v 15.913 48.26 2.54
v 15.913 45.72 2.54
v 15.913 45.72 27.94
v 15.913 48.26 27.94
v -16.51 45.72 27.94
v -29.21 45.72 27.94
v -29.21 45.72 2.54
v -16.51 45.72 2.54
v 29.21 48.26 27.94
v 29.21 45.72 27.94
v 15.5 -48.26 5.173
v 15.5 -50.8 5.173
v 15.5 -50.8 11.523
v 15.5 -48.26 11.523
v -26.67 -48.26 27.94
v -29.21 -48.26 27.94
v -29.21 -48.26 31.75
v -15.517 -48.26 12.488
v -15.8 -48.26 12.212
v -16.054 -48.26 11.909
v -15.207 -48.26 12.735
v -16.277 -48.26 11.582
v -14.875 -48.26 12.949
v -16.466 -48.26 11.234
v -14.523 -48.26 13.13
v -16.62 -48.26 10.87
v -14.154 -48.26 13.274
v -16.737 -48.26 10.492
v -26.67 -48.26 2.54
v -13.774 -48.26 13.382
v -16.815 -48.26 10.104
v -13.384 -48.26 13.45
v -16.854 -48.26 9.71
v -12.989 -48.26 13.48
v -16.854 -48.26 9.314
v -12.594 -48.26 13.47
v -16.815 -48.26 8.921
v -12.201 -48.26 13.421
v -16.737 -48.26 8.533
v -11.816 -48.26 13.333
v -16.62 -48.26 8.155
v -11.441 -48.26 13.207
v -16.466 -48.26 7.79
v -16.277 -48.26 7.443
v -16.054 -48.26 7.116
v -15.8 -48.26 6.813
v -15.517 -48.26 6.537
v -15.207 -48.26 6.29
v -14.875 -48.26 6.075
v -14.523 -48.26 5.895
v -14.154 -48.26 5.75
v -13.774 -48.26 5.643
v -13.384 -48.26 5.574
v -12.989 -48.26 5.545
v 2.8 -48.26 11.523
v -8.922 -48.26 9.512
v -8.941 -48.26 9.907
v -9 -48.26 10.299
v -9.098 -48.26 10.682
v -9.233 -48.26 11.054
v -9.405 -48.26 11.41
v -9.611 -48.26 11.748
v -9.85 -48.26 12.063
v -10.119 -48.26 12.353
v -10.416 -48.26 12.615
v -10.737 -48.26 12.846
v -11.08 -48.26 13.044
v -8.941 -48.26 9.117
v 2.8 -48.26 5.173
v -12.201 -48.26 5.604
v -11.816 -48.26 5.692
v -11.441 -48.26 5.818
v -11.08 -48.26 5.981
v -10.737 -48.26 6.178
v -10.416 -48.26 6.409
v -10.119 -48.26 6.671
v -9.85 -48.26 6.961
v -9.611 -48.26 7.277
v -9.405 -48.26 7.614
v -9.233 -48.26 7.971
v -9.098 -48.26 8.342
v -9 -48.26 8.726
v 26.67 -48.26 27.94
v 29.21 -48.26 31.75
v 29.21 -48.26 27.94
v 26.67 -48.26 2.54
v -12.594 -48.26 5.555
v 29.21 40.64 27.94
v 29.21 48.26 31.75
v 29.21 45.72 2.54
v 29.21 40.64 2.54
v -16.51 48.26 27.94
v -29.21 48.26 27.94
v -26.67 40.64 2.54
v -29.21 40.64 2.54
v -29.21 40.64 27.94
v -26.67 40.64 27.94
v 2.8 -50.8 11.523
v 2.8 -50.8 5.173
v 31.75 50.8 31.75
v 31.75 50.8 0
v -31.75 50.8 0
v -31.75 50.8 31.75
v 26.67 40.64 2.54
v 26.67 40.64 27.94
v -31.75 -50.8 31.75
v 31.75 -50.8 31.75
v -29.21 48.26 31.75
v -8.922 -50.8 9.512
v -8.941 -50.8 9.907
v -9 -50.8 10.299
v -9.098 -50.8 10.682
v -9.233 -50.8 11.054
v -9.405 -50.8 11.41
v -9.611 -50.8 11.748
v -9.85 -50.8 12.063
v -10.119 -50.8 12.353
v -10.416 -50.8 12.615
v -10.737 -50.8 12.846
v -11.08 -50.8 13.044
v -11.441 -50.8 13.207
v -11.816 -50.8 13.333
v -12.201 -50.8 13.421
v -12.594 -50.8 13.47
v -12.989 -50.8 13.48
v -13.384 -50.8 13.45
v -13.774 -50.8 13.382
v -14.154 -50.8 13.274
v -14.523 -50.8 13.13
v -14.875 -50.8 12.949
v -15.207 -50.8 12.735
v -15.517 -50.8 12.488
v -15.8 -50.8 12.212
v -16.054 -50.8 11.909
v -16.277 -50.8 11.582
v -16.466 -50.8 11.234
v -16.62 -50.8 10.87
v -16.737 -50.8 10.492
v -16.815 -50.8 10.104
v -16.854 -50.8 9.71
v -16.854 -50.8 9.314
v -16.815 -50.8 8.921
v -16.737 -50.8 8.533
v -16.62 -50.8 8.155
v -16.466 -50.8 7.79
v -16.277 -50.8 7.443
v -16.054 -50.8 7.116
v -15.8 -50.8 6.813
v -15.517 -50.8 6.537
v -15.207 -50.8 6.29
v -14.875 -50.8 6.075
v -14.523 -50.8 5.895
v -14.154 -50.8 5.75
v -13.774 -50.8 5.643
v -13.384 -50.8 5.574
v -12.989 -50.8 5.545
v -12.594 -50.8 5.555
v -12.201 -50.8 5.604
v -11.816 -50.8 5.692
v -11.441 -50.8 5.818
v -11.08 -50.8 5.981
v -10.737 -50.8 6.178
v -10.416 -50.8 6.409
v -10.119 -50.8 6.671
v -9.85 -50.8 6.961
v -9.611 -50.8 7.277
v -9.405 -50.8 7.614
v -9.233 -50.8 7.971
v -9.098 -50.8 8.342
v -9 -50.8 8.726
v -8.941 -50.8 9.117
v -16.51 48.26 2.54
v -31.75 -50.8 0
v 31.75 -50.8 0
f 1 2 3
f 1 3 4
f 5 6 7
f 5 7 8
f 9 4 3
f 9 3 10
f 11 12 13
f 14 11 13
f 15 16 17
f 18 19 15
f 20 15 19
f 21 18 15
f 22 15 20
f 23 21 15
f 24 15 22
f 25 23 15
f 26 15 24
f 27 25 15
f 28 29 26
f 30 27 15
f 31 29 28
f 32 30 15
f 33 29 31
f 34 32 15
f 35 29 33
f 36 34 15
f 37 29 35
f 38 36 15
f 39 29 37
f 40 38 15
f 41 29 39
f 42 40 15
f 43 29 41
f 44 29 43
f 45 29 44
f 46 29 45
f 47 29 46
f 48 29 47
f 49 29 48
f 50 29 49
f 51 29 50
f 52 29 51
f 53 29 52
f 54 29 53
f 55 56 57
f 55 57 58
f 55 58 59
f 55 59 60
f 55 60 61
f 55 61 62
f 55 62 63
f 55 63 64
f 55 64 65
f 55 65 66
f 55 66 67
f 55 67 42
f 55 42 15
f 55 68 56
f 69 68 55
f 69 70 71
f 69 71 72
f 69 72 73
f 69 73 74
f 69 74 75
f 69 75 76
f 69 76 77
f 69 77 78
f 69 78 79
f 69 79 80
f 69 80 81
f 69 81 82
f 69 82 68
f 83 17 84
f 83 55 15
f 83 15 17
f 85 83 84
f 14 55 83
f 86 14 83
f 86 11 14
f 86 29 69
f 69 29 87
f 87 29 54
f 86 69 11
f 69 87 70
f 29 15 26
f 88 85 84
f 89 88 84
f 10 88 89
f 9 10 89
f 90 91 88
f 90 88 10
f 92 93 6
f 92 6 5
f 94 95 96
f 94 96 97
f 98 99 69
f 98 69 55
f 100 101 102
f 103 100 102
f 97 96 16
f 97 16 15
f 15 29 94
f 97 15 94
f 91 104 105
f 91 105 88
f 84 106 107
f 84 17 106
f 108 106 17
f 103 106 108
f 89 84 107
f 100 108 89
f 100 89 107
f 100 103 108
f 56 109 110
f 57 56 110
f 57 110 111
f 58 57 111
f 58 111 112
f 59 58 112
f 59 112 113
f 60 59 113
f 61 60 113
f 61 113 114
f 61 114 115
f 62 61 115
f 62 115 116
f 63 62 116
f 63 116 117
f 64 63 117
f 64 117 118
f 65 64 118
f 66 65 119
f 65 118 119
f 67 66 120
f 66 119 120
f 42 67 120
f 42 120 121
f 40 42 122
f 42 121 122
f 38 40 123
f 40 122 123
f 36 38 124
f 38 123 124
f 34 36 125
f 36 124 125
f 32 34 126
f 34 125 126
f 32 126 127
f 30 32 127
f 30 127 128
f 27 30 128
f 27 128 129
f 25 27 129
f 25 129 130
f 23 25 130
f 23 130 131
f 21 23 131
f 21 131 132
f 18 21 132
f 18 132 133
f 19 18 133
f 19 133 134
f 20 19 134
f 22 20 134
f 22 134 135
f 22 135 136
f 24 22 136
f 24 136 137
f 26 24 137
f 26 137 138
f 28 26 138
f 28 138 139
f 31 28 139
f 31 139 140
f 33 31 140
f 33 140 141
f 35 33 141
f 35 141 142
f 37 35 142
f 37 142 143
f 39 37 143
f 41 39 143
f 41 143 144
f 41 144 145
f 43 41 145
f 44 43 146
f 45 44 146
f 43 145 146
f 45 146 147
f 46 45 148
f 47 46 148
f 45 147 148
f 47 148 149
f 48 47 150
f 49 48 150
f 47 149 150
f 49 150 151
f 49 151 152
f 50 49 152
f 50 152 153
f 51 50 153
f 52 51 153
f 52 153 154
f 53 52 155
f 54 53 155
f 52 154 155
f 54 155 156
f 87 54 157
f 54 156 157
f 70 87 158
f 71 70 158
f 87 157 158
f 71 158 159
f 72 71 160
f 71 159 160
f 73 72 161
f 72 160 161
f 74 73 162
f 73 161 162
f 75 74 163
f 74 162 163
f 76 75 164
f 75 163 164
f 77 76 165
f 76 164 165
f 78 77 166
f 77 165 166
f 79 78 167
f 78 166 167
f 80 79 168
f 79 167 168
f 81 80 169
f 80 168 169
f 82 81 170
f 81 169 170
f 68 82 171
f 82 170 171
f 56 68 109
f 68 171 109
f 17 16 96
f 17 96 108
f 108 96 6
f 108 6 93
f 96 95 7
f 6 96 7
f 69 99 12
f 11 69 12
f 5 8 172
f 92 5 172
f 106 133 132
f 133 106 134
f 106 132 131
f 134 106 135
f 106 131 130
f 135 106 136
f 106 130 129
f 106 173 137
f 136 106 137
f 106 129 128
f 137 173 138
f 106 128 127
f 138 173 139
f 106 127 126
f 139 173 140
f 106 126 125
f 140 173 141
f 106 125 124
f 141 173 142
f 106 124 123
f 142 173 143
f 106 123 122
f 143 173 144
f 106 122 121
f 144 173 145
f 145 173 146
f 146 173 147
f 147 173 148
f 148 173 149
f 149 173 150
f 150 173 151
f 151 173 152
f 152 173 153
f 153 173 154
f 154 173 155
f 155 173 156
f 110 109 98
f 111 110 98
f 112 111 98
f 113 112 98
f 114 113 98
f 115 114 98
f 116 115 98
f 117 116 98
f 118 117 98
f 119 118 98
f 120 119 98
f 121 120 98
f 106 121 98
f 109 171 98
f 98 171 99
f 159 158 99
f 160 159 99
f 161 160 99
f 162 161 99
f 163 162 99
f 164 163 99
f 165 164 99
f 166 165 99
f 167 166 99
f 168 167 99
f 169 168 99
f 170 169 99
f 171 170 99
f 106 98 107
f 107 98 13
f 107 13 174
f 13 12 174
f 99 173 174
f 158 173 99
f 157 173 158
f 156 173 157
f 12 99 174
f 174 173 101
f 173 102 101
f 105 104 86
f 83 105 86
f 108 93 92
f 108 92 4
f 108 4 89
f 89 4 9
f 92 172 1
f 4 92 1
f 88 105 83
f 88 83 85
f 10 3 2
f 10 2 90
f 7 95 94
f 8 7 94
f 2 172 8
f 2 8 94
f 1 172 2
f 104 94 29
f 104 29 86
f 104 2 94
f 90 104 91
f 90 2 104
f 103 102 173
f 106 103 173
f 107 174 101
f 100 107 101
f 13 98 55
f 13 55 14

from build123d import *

# Parameters (mm, degrees)
F0_W     = 58.42
F0_H     = 96.52
F1_DEPTH = 2.54
F0_W_2   = 2.54
F0_H_2   = 2.54
F2_DEPTH = 31.75
F3_W     = 2.54
F3_H     = 5.08
F3_H_2   = 2.54
F3_W_2   = 10.16
F3_W_3   = 10.7568990868
F3_H_3   = 83.82
F4_DEPTH = 25.4
F5_R     = 3.96875
F5_W     = 12.7
F5_H     = 6.35
F6_DEPTH = 25.4


with BuildPart() as f1:
    # F0 (on Top) → F1 (new body)
    with BuildSketch(Plane.XY):
        Rectangle(F0_W, F0_H)
    extrude(amount=F1_DEPTH)

    # F0 (on Top) → F2 (join)
    with BuildSketch(Plane.XY):
        with Locations((-30.48, 49.53)):
            Rectangle(F0_W_2, F0_H_2)
        with Locations((0, 49.53)):
            Rectangle(F0_W, F0_H_2)
        with Locations((-30.48, 0)):
            Rectangle(F0_W_2, F0_H)
        with Locations((30.48, 49.53)):
            Rectangle(F0_W_2, F0_H_2)
        with Locations((-30.48, -49.53)):
            Rectangle(F0_W_2, F0_H_2)
        with Locations((30.48, 0)):
            Rectangle(F0_W_2, F0_H)
        with Locations((0, -49.53)):
            Rectangle(F0_W, F0_H_2)
        with Locations((30.48, -49.53)):
            Rectangle(F0_W_2, F0_H_2)
    extrude(amount=F2_DEPTH)

    # F3 (on face) → F4 (join)
    with BuildSketch(Plane.XY.offset(2.54)):
        with Locations((-27.94, 38.1)):
            Rectangle(F3_W, F3_H)
        with Locations((-27.94, 46.99)):
            Rectangle(F3_W, F3_H_2)
        with Locations((-21.59, 46.99)):
            Rectangle(F3_W_2, F3_H_2)
        with Locations((21.2915504566, 46.99)):
            Rectangle(F3_W_3, F3_H_2)
        with Locations((27.94, 46.99)):
            Rectangle(F3_W, F3_H_2)
        with Locations((27.94, 38.1)):
            Rectangle(F3_W, F3_H)
        with Locations((27.94, -6.35)):
            Rectangle(F3_W, F3_H_3)
        with Locations((-27.94, -6.35)):
            Rectangle(F3_W, F3_H_3)
    extrude(amount=F4_DEPTH)

    # F5 (on face) → F6 (cut)
    with BuildSketch(Plane.XZ.offset(50.8)):
        with Locations((-12.8904990852, 9.5123006031)):
            Circle(F5_R)
        with Locations((9.1495838234, 8.3475278727)):
            Rectangle(F5_W, F5_H)
    extrude(amount=-F6_DEPTH, mode=Mode.SUBTRACT)


solid = f1.part
